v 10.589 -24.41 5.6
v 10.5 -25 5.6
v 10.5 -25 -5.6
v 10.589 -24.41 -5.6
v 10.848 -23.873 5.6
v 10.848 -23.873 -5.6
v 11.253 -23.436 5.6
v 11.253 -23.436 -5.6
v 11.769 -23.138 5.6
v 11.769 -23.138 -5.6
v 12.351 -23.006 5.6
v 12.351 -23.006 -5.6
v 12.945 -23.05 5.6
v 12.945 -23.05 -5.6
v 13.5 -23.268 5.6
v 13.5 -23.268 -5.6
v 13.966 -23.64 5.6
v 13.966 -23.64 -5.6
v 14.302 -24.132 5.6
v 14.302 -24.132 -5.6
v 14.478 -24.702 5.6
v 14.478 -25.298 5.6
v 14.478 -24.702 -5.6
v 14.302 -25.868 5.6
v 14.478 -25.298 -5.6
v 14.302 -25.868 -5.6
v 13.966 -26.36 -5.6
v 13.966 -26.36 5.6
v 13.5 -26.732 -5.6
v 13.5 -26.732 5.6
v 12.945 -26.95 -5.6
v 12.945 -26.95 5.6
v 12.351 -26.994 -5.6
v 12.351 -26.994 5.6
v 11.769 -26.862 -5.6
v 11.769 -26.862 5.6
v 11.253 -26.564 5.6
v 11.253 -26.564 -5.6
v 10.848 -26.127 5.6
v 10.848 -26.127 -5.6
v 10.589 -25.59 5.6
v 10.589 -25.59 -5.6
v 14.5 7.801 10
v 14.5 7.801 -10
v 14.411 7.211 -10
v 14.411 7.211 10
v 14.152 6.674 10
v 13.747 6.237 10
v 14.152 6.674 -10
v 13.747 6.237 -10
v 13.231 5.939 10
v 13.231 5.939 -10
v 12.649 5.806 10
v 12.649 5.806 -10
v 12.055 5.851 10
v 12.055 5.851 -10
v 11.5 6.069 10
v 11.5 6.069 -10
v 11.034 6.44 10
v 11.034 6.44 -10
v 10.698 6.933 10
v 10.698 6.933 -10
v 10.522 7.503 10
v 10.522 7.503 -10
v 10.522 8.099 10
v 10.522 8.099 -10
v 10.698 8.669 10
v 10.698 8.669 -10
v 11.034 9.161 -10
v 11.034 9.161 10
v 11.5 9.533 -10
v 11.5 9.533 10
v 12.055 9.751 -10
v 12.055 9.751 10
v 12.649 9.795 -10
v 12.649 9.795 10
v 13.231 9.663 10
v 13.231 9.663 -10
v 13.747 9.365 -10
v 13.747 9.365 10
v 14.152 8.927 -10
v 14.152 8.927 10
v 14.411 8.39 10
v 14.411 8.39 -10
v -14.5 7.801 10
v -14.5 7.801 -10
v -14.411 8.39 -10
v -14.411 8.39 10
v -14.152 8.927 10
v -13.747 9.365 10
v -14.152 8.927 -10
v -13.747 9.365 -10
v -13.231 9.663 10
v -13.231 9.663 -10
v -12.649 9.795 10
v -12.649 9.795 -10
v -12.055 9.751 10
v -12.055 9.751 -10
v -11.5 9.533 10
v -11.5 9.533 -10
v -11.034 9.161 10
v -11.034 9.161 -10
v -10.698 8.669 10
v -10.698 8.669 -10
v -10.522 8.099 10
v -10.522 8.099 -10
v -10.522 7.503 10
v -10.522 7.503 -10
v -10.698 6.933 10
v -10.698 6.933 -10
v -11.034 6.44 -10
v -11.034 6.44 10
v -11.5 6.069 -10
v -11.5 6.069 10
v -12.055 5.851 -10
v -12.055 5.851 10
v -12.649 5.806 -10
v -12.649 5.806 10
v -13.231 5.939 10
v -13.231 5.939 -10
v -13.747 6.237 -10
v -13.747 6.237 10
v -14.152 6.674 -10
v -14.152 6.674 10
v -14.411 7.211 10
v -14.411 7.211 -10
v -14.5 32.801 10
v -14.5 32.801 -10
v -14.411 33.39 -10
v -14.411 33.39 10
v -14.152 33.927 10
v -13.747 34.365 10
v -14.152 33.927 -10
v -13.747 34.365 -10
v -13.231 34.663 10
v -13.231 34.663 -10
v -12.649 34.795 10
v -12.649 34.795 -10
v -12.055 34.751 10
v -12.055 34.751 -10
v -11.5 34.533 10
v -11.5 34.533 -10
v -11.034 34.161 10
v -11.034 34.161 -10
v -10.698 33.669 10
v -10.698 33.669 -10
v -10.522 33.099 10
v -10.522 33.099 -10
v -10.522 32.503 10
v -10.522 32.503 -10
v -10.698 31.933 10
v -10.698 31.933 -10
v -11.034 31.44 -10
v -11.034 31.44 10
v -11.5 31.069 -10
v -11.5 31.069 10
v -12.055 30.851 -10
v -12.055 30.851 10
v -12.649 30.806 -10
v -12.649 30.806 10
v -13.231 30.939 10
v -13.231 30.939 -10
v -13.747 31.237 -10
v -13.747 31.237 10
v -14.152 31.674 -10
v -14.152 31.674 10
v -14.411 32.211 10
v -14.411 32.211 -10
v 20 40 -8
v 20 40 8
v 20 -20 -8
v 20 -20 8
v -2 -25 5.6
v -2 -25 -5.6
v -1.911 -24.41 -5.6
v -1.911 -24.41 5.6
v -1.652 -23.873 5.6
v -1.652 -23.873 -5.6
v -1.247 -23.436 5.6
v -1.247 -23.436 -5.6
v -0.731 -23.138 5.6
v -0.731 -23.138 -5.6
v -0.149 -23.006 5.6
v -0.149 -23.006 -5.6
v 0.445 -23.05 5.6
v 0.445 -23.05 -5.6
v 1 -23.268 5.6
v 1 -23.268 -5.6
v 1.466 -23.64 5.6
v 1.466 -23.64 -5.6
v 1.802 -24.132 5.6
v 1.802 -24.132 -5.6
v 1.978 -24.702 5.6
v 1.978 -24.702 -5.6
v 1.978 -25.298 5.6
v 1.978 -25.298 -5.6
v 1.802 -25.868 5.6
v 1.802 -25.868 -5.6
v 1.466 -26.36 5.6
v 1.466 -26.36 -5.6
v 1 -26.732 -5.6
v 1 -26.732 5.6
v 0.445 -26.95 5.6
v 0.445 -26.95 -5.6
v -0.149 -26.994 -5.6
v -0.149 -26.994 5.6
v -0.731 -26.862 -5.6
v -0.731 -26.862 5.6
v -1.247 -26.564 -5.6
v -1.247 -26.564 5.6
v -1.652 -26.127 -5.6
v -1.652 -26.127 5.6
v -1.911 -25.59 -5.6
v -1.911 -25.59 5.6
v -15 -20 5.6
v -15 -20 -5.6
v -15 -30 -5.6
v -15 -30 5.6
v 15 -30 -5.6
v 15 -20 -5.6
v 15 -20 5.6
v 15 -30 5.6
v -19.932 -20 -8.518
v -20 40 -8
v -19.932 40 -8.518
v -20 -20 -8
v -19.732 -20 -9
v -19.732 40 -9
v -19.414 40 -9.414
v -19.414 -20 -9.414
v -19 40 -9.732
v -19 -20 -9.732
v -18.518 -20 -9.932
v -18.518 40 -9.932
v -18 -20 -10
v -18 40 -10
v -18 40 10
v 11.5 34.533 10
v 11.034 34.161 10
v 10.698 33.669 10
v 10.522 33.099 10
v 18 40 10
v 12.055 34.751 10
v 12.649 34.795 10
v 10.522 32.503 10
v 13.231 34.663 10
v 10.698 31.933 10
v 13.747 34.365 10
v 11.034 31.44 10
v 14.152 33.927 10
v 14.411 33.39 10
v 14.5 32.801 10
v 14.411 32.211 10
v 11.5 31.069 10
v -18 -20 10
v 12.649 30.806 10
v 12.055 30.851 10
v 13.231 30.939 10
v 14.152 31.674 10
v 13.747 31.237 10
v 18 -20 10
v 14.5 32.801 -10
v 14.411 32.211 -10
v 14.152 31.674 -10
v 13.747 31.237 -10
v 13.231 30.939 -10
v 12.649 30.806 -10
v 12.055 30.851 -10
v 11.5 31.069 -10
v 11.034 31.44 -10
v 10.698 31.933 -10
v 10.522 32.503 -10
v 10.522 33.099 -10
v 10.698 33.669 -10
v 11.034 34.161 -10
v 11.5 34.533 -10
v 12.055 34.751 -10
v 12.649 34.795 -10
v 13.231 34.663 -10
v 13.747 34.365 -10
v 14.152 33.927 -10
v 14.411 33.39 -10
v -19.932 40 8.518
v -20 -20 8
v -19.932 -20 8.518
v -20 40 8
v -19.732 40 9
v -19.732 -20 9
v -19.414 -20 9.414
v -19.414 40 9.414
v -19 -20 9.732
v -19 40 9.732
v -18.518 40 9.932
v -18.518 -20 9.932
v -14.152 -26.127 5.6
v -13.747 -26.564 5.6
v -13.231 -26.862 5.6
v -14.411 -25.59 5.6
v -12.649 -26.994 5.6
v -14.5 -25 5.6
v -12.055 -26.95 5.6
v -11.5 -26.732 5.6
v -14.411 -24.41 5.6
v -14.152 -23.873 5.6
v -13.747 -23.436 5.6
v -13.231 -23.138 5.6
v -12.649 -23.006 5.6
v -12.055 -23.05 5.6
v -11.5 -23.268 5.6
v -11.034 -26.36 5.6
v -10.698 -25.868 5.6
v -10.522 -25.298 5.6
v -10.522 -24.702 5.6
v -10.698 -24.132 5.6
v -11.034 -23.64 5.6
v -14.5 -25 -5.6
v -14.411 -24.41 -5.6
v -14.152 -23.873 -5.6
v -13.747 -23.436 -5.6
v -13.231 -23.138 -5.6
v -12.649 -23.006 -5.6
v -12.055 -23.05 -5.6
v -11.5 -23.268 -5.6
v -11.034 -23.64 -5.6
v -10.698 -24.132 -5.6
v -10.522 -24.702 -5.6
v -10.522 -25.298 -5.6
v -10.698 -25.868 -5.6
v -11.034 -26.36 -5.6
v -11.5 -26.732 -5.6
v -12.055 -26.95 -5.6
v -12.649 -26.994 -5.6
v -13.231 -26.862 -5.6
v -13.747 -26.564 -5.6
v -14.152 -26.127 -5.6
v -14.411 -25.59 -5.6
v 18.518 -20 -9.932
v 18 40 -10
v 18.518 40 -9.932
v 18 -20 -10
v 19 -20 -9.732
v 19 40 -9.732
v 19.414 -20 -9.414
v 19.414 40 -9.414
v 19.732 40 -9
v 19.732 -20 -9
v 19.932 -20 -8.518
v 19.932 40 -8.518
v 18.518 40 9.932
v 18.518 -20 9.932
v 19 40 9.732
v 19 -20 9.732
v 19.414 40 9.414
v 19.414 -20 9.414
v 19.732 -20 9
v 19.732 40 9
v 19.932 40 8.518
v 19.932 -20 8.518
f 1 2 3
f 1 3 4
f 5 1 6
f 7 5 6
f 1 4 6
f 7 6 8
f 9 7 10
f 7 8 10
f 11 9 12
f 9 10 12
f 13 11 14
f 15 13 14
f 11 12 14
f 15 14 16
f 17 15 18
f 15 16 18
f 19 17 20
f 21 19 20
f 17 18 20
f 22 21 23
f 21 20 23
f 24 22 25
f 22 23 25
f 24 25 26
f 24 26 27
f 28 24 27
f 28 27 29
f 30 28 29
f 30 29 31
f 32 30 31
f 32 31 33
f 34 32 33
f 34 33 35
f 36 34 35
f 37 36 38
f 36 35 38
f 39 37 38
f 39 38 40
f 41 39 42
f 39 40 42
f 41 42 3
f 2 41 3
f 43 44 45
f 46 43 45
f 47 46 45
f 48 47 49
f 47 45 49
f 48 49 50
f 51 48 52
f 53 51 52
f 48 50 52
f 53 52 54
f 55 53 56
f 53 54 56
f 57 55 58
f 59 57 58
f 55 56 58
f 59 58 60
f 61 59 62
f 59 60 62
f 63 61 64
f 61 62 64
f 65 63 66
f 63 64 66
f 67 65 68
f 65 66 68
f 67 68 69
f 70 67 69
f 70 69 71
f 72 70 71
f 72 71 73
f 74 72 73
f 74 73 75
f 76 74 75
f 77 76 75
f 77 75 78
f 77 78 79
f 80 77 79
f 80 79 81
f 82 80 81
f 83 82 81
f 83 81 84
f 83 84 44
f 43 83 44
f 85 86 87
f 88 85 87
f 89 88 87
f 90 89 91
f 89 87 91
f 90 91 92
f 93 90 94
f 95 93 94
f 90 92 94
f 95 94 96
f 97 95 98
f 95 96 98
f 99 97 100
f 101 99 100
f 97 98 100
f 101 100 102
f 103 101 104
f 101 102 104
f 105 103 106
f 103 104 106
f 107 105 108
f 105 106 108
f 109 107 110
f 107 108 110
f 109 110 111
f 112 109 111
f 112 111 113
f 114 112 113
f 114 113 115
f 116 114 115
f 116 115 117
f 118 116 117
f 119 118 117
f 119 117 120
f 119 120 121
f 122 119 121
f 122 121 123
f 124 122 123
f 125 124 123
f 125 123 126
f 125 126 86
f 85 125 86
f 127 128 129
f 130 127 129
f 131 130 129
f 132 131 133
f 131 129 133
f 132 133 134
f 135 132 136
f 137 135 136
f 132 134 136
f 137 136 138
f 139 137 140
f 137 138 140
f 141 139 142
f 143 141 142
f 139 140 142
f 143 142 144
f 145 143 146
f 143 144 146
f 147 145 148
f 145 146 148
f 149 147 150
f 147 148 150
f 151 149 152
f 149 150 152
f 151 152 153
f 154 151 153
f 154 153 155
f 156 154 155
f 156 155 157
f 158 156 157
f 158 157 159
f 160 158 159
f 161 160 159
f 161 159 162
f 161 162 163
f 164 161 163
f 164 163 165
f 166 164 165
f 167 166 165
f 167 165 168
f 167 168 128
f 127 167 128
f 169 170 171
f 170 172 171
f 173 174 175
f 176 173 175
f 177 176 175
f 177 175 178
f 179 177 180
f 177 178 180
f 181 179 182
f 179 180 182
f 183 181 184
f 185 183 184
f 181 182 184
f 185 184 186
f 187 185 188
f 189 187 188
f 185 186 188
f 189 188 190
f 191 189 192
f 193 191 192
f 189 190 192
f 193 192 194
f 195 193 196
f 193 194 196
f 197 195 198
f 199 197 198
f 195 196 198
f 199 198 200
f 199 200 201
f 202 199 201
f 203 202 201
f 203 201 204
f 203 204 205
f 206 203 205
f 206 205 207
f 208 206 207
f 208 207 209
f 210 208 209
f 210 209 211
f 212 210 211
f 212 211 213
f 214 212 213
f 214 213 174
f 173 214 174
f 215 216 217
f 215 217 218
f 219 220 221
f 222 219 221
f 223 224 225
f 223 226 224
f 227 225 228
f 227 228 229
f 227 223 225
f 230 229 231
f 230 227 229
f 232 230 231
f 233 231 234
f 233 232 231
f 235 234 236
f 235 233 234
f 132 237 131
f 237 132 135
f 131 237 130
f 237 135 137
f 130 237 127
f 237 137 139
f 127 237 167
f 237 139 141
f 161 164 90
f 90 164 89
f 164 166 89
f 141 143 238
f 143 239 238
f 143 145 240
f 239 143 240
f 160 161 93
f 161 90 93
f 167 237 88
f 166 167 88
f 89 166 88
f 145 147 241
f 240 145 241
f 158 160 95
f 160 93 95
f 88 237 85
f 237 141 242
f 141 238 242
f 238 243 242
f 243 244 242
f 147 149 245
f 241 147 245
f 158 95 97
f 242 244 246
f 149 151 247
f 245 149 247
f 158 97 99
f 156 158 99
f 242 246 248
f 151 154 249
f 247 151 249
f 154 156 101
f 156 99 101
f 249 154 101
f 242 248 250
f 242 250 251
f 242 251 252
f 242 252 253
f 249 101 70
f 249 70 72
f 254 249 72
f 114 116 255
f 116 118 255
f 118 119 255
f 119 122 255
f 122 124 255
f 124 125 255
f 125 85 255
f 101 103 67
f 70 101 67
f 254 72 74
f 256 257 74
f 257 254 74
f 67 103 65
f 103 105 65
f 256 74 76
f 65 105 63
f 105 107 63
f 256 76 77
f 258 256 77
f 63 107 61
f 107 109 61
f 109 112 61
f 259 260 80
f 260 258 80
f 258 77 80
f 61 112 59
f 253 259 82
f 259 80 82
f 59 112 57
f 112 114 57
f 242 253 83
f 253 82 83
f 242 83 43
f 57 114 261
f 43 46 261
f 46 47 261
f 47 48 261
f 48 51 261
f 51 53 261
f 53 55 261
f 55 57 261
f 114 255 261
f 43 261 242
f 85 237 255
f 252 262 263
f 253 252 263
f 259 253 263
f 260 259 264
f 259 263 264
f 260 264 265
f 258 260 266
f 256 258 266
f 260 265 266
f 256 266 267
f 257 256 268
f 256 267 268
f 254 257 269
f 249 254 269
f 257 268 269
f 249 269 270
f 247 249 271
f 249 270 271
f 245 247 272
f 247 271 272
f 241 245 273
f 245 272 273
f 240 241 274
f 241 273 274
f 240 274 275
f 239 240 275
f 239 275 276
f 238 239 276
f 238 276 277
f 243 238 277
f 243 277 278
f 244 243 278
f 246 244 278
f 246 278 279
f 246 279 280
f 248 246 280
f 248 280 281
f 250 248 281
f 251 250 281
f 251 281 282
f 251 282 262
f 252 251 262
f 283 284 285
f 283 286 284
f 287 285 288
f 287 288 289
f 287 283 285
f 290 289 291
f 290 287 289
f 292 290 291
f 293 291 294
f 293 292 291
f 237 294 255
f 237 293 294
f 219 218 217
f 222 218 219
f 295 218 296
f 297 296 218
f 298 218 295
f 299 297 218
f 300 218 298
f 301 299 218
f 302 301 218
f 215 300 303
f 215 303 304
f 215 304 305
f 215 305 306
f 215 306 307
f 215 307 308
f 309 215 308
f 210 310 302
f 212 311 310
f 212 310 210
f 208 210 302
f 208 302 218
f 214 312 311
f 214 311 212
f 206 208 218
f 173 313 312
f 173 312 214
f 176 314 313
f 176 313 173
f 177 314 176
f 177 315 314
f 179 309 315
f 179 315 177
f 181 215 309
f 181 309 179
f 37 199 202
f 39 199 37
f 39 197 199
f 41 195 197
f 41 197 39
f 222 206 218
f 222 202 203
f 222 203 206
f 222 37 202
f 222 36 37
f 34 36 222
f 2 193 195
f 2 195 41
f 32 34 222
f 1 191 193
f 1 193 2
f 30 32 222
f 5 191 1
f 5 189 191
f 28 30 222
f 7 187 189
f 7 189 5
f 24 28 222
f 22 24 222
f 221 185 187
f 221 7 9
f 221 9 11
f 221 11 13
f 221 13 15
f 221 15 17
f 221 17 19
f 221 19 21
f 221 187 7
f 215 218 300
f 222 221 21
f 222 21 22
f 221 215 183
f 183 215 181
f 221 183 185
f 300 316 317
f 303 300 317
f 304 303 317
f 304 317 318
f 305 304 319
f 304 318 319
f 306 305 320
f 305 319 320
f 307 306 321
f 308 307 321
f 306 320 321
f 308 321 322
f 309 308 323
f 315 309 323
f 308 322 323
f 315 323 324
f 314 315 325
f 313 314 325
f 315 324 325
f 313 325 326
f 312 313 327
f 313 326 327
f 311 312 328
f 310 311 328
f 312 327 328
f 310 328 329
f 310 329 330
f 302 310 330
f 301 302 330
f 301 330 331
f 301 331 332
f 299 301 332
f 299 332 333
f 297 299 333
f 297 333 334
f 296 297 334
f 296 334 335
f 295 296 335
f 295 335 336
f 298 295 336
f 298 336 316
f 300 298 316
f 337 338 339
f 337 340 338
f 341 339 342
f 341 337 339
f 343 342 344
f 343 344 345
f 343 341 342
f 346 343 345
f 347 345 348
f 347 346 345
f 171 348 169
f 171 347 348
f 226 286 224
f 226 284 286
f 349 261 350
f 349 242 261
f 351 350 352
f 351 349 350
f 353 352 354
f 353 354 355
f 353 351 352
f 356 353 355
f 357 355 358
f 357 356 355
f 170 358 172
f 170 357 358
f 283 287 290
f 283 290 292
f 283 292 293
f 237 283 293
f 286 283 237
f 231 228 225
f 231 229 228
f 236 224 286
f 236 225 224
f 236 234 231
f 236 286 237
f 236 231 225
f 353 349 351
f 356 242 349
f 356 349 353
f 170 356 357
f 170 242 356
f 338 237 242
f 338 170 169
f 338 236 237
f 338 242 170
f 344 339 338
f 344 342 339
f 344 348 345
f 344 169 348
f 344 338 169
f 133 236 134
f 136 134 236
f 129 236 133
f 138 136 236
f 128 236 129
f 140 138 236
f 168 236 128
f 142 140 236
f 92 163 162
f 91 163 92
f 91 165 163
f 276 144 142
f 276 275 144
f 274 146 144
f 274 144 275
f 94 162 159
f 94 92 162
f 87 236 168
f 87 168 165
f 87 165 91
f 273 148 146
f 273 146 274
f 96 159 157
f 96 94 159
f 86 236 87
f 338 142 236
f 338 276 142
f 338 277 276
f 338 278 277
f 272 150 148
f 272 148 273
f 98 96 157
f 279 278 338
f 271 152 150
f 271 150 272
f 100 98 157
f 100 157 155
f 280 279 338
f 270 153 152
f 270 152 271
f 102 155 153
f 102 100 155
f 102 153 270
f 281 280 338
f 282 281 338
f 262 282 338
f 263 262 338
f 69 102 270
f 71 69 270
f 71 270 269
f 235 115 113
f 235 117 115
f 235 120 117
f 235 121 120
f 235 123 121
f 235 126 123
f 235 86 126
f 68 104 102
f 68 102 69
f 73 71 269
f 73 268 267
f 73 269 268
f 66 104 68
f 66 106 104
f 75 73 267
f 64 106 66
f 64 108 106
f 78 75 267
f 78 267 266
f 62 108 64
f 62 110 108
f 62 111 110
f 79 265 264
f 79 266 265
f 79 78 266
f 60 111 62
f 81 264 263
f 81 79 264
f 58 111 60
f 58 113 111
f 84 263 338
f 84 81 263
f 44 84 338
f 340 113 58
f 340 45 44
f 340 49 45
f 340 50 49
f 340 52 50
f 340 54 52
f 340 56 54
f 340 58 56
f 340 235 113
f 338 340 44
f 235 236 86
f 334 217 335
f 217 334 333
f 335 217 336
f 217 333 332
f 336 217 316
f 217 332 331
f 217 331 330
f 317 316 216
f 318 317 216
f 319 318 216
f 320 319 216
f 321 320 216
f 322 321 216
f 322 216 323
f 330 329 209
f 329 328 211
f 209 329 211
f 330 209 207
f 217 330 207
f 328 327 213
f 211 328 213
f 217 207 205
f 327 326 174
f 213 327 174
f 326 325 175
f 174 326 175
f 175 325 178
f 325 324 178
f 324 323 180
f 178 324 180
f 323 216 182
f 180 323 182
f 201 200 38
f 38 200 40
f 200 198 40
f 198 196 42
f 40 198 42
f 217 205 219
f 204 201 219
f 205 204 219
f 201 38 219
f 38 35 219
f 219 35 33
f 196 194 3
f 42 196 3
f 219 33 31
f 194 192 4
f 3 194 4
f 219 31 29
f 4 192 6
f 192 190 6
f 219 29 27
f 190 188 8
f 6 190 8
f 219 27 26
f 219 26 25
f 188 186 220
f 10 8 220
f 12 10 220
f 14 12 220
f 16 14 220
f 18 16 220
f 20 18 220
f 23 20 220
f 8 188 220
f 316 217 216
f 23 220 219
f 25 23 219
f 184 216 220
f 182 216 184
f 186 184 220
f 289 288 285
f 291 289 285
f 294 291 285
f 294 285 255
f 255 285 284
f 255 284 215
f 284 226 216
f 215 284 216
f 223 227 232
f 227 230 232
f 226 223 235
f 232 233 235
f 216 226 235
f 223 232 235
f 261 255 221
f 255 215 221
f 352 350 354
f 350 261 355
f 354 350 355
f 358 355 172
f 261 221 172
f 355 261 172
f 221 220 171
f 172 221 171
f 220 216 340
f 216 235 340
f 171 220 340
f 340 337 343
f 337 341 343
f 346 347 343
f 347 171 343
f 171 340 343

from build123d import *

# Parameters (mm, degrees)
SKETCH1_W           = 40
SKETCH1_H           = 20
BOSS_EXTRUDE1_DEPTH = 20
SKETCH3_W           = 40
SKETCH3_H           = 20
BOSS_EXTRUDE2_DEPTH = 40
SKETCH4_W           = 30
SKETCH4_H           = 11.2
BOSS_EXTRUDE3_DEPTH = 10
SKETCH5_R           = 2
CUT_EXTRUDE1_DEPTH  = 35
SKETCH6_R           = 2
CUT_EXTRUDE2_DEPTH  = 35
FILLET2_R           = 2


with BuildPart() as part:
    # Sketch1 → Boss-Extrude1 (new body)
    with BuildSketch(Plane(origin=(0, 0, 0), x_dir=(1, 0, 0), z_dir=(0, 1, 0))):
        Rectangle(SKETCH1_W, SKETCH1_H)
    extrude(amount=-BOSS_EXTRUDE1_DEPTH)

    # Sketch3 → Boss-Extrude2 (add)
    with BuildSketch(Plane(origin=(0, 0, 0), x_dir=(1, 0, 0), z_dir=(0, 1, 0))):
        Rectangle(SKETCH3_W, SKETCH3_H)
    extrude(amount=BOSS_EXTRUDE2_DEPTH)

    # Sketch4 → Boss-Extrude3 (add)
    with BuildSketch(Plane.XZ.offset(20)):
        Rectangle(SKETCH4_W, SKETCH4_H)
    extrude(amount=BOSS_EXTRUDE3_DEPTH)

    # Sketch5 → Cut-Extrude1 (cut, symmetric)
    with BuildSketch(Plane(origin=(0, 0, -5.6), x_dir=(-1, 0, 0), z_dir=(0, 0, -1))):
        with Locations((0, -25)):
            Circle(SKETCH5_R)
        with Locations((12.5, -25)):
            Circle(SKETCH5_R)
        with Locations((-12.5, -25)):
            Circle(SKETCH5_R)
    extrude(amount=CUT_EXTRUDE1_DEPTH, both=True, mode=Mode.SUBTRACT)

    # Sketch6 → Cut-Extrude2 (cut)
    with BuildSketch(Plane(origin=(0, 0, -10), x_dir=(-1, 0, 0), z_dir=(0, 0, -1))):
        with Locations((12.5, 7.800844988)):
            Circle(SKETCH6_R)
        with Locations((12.5, 32.800844988)):
            Circle(SKETCH6_R)
        with Locations(Location((-12.5, 32.800844988, 0), (0, 0, 180))):
            Circle(SKETCH6_R)
        with Locations(Location((-12.5, 7.800844988, 0), (0, 0, 180))):
            Circle(SKETCH6_R)
    extrude(amount=-CUT_EXTRUDE2_DEPTH, mode=Mode.SUBTRACT)

    # Fillet2
    fillet2_edges = [part.edges().sort_by_distance(p)[0] for p in [
        (-20, 10, -10),
        (20, 10, -10),
        (20, 10, 10),
        (-20, 10, 10),
    ]]
    fillet(fillet2_edges, radius=FILLET2_R)


solid = part.part
